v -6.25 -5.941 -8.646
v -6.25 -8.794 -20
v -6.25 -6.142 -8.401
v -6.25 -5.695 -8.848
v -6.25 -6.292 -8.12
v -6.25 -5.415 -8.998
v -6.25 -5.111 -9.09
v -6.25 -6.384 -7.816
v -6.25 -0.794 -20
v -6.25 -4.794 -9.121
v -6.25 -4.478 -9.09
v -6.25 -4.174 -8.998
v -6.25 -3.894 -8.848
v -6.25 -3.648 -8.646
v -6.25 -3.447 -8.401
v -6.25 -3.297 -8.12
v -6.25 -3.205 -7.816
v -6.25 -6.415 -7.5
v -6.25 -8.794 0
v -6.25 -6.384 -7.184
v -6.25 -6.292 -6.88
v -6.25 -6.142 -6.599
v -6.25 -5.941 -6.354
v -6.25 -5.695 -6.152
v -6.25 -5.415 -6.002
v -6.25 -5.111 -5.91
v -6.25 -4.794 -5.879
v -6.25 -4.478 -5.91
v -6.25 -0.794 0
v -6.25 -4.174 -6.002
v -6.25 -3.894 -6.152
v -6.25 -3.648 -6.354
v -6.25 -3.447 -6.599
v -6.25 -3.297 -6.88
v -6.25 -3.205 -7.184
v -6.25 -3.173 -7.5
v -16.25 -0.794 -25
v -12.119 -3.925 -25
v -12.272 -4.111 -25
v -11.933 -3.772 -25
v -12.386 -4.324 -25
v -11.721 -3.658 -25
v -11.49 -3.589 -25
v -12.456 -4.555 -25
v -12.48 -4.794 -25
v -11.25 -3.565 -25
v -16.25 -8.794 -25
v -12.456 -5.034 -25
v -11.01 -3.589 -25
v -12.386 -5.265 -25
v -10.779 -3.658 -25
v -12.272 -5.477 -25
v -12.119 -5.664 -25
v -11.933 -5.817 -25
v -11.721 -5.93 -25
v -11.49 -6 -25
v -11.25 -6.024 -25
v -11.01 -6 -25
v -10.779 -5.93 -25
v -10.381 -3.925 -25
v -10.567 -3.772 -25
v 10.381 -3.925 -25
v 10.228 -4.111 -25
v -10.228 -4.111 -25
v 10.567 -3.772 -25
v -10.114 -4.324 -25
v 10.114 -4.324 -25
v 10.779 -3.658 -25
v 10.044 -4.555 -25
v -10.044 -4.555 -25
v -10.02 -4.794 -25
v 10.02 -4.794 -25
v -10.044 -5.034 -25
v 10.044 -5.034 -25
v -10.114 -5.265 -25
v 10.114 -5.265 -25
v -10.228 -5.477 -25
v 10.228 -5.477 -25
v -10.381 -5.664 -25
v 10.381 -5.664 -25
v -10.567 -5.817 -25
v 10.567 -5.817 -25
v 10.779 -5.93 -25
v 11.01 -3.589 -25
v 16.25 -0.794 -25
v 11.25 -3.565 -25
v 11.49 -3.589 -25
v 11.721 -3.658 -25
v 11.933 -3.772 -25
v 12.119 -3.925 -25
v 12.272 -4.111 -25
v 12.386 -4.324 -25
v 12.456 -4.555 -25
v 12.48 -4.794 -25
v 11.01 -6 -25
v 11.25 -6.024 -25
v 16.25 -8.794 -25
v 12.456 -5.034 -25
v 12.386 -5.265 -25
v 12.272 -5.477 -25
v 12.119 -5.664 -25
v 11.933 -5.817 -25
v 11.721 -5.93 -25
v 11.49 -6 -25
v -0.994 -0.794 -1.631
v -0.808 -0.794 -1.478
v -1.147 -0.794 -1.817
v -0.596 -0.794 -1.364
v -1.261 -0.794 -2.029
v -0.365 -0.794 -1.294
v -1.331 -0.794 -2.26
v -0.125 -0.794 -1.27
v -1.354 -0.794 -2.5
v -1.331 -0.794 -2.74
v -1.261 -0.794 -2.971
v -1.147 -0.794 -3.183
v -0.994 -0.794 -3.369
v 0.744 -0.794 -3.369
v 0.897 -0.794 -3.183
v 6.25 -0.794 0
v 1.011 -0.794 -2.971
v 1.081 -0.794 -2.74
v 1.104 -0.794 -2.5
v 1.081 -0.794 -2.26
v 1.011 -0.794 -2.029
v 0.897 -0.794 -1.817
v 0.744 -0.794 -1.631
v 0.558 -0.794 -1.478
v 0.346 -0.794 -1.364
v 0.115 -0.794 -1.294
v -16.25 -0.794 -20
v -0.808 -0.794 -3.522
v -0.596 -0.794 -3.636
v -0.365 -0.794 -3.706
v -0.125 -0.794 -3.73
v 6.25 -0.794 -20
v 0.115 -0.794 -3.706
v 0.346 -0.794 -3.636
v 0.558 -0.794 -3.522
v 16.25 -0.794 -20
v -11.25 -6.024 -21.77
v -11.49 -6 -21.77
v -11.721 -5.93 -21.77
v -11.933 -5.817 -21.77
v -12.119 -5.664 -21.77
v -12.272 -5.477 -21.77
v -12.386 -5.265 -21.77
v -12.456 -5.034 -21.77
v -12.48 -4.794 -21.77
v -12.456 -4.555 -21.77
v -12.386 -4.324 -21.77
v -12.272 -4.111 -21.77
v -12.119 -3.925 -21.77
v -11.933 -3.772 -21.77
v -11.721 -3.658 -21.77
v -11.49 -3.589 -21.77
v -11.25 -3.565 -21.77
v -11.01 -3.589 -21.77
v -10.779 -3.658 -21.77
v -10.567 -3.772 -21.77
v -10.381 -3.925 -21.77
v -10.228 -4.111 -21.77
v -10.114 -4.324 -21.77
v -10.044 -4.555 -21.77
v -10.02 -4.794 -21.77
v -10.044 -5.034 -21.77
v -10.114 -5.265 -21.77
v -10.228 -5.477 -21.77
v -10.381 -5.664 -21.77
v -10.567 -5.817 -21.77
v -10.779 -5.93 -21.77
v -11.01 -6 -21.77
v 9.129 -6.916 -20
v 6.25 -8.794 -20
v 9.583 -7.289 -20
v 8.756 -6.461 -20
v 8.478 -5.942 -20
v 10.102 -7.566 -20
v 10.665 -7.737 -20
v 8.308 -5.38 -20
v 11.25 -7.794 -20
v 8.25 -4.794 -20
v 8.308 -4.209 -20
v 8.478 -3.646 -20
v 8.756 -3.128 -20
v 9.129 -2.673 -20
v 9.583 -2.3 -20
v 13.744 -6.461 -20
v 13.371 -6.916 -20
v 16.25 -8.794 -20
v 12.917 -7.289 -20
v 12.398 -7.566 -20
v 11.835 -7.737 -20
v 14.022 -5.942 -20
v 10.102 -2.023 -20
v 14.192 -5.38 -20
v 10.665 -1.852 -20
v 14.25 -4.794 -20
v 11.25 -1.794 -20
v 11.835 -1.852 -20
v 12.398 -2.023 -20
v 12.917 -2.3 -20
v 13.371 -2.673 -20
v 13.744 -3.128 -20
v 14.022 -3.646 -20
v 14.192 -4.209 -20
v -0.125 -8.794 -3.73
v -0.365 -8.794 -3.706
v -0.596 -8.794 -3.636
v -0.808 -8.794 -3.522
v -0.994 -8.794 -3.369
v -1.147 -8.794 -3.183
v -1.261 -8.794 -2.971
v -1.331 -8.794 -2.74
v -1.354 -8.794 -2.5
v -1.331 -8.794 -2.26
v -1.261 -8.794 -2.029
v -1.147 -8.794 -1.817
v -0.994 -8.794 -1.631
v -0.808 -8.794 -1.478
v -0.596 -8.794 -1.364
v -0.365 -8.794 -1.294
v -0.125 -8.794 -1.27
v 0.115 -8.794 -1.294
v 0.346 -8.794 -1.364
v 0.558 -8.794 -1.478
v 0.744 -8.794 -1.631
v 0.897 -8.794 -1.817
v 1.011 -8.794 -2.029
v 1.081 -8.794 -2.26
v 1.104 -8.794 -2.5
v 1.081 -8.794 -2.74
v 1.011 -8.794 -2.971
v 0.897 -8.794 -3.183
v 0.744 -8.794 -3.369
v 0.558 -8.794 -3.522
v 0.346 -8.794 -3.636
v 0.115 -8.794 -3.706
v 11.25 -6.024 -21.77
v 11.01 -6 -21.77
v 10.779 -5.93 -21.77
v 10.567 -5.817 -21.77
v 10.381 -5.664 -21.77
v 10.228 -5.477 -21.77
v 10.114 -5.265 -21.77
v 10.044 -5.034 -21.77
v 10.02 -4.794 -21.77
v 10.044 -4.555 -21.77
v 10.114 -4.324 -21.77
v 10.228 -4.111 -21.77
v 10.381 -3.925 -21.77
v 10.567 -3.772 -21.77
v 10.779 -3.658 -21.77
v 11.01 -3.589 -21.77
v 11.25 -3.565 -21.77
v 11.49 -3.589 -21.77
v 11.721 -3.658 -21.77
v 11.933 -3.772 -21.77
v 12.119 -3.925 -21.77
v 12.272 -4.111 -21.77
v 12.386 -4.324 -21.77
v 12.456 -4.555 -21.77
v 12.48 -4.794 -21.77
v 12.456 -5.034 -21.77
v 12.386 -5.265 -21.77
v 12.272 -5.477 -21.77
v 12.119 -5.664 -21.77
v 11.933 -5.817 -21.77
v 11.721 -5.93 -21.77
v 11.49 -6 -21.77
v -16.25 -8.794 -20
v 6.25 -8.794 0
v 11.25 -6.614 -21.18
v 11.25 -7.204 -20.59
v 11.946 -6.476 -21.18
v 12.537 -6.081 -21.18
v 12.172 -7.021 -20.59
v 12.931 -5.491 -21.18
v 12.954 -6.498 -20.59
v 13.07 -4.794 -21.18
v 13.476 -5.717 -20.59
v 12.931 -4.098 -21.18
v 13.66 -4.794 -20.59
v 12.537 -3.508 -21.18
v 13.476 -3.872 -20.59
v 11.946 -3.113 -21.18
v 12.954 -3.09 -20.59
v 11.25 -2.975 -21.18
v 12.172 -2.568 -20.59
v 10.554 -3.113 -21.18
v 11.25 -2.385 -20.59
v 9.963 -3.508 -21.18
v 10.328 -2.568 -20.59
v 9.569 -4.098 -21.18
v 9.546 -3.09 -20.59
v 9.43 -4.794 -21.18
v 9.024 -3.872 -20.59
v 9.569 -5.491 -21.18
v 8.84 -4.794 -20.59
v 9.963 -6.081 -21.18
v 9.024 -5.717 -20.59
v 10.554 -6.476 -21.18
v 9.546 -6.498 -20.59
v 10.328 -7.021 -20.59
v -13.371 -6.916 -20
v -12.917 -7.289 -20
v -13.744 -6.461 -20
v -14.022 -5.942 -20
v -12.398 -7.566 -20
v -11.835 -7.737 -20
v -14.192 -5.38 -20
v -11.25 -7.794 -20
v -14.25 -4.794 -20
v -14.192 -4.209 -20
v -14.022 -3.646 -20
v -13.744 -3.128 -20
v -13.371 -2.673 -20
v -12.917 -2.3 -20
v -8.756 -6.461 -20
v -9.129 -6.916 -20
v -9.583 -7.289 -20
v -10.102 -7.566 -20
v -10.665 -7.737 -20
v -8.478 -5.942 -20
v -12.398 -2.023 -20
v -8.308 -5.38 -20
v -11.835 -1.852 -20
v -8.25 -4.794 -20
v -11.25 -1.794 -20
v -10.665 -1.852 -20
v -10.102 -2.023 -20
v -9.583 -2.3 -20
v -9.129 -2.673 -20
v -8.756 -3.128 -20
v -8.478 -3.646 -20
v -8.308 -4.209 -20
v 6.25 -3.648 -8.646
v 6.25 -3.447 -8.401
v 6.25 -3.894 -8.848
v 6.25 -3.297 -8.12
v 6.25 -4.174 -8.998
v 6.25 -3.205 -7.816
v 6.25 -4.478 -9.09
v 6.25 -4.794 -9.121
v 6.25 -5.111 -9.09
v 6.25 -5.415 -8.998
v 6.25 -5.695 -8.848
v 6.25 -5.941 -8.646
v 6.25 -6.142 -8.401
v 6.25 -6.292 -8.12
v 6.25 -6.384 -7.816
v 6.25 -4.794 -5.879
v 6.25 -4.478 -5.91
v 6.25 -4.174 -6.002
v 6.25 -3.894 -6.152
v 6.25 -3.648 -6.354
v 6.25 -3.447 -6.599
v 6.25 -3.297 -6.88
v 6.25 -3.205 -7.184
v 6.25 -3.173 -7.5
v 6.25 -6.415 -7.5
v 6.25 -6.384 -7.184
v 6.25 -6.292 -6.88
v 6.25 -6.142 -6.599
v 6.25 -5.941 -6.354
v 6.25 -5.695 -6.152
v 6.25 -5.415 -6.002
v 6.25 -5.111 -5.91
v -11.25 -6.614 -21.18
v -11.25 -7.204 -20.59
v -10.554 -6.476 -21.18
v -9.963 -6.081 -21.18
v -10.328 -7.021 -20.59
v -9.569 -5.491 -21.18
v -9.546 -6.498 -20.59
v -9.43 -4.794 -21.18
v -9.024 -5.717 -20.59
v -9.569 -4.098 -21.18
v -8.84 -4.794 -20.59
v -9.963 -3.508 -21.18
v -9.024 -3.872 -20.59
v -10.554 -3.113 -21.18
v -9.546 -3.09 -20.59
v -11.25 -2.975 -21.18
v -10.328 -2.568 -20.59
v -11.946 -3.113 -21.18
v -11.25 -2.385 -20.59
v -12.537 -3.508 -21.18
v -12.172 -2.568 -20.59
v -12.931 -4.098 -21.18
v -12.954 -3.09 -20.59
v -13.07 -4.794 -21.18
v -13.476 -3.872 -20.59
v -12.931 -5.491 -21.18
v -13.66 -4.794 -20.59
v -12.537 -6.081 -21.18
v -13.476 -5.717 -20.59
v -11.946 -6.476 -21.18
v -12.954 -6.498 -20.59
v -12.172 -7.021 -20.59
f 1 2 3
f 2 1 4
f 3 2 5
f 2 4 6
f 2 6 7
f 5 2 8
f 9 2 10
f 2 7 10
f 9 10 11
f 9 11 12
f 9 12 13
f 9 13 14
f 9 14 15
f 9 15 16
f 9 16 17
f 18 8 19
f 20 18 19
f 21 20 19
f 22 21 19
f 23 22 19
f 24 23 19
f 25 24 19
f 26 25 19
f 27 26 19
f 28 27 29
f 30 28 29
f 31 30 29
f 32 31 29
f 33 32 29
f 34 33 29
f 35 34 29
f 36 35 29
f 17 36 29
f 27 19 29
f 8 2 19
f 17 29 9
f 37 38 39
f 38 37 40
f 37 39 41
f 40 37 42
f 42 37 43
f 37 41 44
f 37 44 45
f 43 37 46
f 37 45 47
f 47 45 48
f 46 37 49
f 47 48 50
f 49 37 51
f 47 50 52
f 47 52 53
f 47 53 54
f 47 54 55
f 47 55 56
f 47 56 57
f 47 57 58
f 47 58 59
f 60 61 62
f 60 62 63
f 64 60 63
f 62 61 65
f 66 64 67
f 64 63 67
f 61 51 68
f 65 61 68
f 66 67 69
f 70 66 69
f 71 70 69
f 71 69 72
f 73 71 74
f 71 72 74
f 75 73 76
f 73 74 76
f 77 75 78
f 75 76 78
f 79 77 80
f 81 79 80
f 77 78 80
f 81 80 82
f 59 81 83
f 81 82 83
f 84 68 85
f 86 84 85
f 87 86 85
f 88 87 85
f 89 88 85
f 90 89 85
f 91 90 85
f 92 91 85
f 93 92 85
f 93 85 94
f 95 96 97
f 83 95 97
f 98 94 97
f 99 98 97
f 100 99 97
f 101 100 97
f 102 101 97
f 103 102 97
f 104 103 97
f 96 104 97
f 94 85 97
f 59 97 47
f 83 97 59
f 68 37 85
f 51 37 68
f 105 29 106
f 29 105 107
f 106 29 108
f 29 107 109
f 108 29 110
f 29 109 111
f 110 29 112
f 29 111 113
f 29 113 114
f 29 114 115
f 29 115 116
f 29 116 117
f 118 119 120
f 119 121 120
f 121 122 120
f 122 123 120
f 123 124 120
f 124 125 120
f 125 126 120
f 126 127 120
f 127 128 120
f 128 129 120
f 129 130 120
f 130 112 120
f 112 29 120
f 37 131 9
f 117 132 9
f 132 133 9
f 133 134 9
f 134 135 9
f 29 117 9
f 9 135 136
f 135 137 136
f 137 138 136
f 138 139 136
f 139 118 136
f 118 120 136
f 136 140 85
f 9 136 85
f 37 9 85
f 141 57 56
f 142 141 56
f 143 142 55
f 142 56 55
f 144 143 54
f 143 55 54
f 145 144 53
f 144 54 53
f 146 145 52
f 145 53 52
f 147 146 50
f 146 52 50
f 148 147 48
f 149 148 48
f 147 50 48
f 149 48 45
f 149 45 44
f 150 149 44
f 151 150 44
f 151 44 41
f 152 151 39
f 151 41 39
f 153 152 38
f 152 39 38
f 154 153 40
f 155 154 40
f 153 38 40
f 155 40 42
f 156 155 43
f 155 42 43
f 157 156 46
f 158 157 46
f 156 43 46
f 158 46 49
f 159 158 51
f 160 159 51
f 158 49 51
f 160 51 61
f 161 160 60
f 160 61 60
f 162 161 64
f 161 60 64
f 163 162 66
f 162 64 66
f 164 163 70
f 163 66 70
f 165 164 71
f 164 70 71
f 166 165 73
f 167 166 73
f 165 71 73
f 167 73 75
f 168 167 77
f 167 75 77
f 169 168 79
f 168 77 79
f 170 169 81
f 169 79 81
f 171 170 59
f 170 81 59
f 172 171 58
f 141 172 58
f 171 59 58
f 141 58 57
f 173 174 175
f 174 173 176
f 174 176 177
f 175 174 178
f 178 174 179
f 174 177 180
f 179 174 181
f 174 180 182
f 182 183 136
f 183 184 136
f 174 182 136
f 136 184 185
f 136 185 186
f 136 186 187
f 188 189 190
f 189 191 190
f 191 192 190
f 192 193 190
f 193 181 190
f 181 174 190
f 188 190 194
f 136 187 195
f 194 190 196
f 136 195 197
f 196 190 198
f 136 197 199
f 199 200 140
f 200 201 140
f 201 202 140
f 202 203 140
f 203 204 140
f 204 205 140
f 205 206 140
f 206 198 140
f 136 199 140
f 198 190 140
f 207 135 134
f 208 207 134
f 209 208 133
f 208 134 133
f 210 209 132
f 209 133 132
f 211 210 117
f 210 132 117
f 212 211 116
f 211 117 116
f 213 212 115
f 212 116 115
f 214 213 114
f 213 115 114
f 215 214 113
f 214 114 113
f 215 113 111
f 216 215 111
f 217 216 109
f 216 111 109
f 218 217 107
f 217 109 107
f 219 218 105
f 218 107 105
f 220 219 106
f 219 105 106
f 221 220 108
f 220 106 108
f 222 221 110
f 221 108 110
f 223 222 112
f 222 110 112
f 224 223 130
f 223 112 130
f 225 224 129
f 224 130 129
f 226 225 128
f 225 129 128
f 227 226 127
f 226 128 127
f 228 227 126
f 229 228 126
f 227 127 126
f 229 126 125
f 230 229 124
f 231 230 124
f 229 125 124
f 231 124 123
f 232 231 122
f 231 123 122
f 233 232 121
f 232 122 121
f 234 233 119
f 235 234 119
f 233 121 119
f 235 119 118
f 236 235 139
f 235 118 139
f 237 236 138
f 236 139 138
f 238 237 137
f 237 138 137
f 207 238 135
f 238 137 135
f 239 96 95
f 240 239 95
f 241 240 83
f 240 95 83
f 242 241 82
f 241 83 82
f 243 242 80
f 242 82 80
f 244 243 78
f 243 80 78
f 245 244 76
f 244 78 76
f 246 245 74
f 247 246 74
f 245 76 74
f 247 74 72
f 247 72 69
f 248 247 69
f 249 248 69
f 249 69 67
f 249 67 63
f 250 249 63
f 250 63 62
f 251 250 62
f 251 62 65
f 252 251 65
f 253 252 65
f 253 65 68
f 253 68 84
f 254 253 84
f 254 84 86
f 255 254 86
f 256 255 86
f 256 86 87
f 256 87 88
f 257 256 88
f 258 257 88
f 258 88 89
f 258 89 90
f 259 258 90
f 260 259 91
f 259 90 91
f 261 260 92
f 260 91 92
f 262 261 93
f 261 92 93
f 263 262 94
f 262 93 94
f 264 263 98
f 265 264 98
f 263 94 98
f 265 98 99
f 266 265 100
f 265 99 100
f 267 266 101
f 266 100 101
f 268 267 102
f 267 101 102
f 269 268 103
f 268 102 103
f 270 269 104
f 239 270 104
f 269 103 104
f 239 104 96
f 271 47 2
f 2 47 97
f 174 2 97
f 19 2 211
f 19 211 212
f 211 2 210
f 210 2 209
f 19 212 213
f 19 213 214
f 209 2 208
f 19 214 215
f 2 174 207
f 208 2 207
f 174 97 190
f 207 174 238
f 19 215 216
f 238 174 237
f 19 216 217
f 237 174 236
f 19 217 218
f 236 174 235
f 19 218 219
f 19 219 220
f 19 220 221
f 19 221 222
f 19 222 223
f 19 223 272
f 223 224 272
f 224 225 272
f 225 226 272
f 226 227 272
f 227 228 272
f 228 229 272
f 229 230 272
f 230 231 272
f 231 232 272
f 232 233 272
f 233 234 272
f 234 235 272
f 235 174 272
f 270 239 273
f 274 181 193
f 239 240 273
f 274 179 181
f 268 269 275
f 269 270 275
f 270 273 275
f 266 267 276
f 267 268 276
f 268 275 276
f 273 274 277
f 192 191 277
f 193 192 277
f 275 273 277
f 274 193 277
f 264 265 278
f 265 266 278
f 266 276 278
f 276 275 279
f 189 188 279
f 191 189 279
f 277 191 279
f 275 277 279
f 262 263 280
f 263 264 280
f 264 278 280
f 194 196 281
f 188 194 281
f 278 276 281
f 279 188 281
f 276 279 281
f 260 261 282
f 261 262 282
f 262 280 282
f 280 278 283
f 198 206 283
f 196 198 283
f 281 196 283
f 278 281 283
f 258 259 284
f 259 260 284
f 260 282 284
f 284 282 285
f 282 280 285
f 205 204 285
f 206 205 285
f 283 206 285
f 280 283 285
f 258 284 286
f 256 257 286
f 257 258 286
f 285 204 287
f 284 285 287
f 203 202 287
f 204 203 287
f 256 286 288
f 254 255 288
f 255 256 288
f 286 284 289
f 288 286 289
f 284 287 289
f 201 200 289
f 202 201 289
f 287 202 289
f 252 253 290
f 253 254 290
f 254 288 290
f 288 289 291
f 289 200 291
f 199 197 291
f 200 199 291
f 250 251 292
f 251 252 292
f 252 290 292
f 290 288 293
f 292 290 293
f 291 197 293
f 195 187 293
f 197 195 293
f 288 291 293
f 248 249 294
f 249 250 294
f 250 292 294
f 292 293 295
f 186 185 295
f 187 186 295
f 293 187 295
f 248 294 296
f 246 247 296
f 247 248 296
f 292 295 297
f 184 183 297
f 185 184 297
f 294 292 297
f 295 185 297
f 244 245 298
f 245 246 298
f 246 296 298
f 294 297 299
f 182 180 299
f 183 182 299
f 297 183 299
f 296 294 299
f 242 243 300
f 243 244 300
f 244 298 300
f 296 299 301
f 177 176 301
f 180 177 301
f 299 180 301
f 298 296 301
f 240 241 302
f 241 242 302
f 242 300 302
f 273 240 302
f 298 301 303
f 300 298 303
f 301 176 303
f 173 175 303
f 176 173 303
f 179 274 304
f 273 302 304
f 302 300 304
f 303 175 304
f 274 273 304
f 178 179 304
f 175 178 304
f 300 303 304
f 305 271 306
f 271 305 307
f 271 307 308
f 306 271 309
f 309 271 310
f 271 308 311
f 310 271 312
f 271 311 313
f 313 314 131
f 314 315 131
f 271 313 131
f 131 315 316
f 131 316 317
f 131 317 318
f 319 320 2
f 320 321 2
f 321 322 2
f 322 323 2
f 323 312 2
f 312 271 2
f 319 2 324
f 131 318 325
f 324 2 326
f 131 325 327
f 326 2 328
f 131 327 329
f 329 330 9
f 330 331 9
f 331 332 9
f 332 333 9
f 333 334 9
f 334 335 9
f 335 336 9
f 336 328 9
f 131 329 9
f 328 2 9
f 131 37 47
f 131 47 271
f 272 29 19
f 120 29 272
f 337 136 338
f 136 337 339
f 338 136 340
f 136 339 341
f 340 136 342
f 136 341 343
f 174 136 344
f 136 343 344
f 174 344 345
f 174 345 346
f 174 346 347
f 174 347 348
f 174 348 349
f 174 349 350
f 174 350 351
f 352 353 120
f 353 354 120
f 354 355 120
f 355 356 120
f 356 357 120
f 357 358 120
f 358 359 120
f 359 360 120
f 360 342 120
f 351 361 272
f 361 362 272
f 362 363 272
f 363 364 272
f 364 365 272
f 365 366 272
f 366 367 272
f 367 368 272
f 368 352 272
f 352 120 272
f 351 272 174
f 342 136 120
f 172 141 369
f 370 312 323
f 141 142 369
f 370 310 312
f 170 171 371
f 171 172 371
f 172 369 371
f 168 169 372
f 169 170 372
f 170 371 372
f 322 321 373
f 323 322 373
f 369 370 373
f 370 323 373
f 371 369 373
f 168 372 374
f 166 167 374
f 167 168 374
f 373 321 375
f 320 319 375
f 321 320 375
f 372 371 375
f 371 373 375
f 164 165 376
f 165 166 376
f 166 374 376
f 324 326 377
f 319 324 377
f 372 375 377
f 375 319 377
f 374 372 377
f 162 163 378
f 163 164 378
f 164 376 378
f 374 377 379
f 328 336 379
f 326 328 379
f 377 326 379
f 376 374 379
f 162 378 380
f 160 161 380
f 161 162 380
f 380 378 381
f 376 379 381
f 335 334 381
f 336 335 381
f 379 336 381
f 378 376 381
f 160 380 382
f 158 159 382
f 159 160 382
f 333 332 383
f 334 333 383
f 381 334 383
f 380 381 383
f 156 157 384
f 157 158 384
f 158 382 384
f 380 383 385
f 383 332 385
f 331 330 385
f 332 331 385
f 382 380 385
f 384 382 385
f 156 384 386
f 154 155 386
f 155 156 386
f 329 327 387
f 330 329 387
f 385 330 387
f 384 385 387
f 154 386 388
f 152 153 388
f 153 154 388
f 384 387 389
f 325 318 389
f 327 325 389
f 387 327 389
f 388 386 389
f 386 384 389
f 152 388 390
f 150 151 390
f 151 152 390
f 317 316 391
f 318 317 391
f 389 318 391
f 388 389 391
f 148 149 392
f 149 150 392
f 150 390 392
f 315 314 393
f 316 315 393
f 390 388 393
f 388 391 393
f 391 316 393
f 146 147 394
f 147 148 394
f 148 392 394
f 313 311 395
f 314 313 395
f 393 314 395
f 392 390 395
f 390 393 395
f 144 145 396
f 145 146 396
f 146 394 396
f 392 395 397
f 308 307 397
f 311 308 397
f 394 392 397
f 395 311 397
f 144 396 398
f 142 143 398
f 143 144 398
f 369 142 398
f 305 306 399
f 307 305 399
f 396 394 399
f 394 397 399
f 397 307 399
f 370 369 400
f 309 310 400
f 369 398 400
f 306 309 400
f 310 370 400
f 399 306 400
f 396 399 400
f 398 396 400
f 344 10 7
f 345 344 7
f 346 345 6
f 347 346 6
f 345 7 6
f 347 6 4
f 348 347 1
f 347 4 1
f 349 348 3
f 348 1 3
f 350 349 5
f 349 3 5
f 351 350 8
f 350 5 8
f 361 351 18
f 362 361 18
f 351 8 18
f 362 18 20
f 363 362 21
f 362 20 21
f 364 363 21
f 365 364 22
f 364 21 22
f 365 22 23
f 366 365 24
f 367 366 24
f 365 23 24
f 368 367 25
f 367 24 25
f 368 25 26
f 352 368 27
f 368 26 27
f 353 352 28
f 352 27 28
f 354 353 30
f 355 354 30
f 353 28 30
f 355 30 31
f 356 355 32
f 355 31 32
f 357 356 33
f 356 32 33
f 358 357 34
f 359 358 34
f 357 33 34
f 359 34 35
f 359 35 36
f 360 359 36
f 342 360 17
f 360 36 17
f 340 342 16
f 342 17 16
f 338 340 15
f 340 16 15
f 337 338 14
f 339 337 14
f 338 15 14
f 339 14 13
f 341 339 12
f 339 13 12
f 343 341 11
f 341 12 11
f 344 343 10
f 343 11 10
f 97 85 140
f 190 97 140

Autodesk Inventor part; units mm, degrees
ref_plane "YZ Plane" through (0, 0, 0) normal (1, 0, 0) x (0, 1, 0)
ref_plane "XZ Plane" through (0, 0, 0) normal (0, 1, 0) x (-1, 0, 0)
ref_plane "XY Plane" through (0, 0, 0) normal (0, 0, 1) x (1, 0, 0)
sketch "Sketch1" plane through (0, 0, 0) normal (0, 0, 1) x (1, 0, 0)
  line L0 (3.9408, -0.7944) -> (3.5592, -0.7944)
  line L1 (1.4408, -0.7944) -> (1.0592, -0.7944)
  line L2 (-1.0592, -0.7944) -> (-1.4408, -0.7944)
  line L3 (-3.5592, -0.7944) -> (-3.9408, -0.7944)
  line L4 (-6.0592, -0.7944) -> (-6.25, -0.7944)
  line L5 (6.25, -0.7944) -> (6.0592, -0.7944)
  line L6 (6.25, -0.7944) -> (6.25, -8.7944)
  line L7 (6.25, -8.7944) -> (-6.25, -8.7944)
  line L8 (-6.25, -8.7944) -> (-6.25, -0.7944)
  line L9 (-6.25, -0.7944) -> (-6.0592, -0.7944)
  line L10 (-3.9408, -0.7944) -> (-3.5592, -0.7944)
  line L11 (-1.4408, -0.7944) -> (-1.0592, -0.7944)
  line L12 (1.0592, -0.7944) -> (1.4408, -0.7944)
  line L13 (3.5592, -0.7944) -> (3.9408, -0.7944)
  line L14 (6.0592, -0.7944) -> (6.25, -0.7944)
  line L15 (-6.25, -0.7944) -> (6.25, -0.7944)
  point P0 (0, 0)
  dimension "height" = 8
extrude "Extrusion1" add sketch "Sketch1" against normal blind 15
hole "Hole1" at (-0.125, -8.7944, -2.5) direction (0, 1, 0) diameter 2.459 end through all thread size "M3x0.5" class "6H" standard "ANSI Metric M Profile"
hole "Hole2" at (6.25, -4.7944, -7.5) direction (-1, 0, 0) diameter 3.242 end through all thread size "M4x0.7" class "6H" standard "ANSI Metric M Profile"
sketch "Sketch2" plane through (0, 0, -15) normal (0, 0, -1) x (-1, 0, 0)
  line L0 (-6.25, -0.7944) -> (-6.25, -8.7944) projected
  line L1 (-6.25, -8.7944) -> (6.25, -8.7944) projected
  line L2 (6.25, -8.7944) -> (6.25, -0.7944) projected
  line L3 (6.25, -0.7944) -> (-6.25, -0.7944) projected
  point P0 (0, 0)
extrude "Extrusion4" add sketch "Sketch2" along normal blind 10
sketch "Sketch4" plane through (-6.25, -8.7944, 0) normal (-1, 0, 0) x (0, 0, 1)
  line L0 (-25, 0) -> (-20, 0)
  line L1 (-20, 0) -> (-20, 8)
  line L2 (-20, 8) -> (-25, 8)
  line L3 (-25, 8) -> (-25, 0)
  point P0 (0, 8.7944)
  dimension "d28" = 5
  dimension "d40" = 8
extrude "Extrusion5" add sketch "Sketch4" along normal blind 10
hole "Hole3" at (-11.25, -4.7944, -20) direction (0, 0, -1) diameter 2.459 end through all countersink diameter 6 countersink angle 90 thread size "M3x0.5" class "6H" standard "ANSI Metric M Profile"
pattern_linear "Rectangular Pattern1" count 2 spacing 22.5 along (1, 0, 0) of "Extrusion5", "Hole3"
equation "\"d12\" = 0.5 * width"
equation "\"d13\" = 0.5 * height"
equation "\"width\" = 15"
properties part number "T2.5 belt holder fixed" material "Aluminum 6061"
